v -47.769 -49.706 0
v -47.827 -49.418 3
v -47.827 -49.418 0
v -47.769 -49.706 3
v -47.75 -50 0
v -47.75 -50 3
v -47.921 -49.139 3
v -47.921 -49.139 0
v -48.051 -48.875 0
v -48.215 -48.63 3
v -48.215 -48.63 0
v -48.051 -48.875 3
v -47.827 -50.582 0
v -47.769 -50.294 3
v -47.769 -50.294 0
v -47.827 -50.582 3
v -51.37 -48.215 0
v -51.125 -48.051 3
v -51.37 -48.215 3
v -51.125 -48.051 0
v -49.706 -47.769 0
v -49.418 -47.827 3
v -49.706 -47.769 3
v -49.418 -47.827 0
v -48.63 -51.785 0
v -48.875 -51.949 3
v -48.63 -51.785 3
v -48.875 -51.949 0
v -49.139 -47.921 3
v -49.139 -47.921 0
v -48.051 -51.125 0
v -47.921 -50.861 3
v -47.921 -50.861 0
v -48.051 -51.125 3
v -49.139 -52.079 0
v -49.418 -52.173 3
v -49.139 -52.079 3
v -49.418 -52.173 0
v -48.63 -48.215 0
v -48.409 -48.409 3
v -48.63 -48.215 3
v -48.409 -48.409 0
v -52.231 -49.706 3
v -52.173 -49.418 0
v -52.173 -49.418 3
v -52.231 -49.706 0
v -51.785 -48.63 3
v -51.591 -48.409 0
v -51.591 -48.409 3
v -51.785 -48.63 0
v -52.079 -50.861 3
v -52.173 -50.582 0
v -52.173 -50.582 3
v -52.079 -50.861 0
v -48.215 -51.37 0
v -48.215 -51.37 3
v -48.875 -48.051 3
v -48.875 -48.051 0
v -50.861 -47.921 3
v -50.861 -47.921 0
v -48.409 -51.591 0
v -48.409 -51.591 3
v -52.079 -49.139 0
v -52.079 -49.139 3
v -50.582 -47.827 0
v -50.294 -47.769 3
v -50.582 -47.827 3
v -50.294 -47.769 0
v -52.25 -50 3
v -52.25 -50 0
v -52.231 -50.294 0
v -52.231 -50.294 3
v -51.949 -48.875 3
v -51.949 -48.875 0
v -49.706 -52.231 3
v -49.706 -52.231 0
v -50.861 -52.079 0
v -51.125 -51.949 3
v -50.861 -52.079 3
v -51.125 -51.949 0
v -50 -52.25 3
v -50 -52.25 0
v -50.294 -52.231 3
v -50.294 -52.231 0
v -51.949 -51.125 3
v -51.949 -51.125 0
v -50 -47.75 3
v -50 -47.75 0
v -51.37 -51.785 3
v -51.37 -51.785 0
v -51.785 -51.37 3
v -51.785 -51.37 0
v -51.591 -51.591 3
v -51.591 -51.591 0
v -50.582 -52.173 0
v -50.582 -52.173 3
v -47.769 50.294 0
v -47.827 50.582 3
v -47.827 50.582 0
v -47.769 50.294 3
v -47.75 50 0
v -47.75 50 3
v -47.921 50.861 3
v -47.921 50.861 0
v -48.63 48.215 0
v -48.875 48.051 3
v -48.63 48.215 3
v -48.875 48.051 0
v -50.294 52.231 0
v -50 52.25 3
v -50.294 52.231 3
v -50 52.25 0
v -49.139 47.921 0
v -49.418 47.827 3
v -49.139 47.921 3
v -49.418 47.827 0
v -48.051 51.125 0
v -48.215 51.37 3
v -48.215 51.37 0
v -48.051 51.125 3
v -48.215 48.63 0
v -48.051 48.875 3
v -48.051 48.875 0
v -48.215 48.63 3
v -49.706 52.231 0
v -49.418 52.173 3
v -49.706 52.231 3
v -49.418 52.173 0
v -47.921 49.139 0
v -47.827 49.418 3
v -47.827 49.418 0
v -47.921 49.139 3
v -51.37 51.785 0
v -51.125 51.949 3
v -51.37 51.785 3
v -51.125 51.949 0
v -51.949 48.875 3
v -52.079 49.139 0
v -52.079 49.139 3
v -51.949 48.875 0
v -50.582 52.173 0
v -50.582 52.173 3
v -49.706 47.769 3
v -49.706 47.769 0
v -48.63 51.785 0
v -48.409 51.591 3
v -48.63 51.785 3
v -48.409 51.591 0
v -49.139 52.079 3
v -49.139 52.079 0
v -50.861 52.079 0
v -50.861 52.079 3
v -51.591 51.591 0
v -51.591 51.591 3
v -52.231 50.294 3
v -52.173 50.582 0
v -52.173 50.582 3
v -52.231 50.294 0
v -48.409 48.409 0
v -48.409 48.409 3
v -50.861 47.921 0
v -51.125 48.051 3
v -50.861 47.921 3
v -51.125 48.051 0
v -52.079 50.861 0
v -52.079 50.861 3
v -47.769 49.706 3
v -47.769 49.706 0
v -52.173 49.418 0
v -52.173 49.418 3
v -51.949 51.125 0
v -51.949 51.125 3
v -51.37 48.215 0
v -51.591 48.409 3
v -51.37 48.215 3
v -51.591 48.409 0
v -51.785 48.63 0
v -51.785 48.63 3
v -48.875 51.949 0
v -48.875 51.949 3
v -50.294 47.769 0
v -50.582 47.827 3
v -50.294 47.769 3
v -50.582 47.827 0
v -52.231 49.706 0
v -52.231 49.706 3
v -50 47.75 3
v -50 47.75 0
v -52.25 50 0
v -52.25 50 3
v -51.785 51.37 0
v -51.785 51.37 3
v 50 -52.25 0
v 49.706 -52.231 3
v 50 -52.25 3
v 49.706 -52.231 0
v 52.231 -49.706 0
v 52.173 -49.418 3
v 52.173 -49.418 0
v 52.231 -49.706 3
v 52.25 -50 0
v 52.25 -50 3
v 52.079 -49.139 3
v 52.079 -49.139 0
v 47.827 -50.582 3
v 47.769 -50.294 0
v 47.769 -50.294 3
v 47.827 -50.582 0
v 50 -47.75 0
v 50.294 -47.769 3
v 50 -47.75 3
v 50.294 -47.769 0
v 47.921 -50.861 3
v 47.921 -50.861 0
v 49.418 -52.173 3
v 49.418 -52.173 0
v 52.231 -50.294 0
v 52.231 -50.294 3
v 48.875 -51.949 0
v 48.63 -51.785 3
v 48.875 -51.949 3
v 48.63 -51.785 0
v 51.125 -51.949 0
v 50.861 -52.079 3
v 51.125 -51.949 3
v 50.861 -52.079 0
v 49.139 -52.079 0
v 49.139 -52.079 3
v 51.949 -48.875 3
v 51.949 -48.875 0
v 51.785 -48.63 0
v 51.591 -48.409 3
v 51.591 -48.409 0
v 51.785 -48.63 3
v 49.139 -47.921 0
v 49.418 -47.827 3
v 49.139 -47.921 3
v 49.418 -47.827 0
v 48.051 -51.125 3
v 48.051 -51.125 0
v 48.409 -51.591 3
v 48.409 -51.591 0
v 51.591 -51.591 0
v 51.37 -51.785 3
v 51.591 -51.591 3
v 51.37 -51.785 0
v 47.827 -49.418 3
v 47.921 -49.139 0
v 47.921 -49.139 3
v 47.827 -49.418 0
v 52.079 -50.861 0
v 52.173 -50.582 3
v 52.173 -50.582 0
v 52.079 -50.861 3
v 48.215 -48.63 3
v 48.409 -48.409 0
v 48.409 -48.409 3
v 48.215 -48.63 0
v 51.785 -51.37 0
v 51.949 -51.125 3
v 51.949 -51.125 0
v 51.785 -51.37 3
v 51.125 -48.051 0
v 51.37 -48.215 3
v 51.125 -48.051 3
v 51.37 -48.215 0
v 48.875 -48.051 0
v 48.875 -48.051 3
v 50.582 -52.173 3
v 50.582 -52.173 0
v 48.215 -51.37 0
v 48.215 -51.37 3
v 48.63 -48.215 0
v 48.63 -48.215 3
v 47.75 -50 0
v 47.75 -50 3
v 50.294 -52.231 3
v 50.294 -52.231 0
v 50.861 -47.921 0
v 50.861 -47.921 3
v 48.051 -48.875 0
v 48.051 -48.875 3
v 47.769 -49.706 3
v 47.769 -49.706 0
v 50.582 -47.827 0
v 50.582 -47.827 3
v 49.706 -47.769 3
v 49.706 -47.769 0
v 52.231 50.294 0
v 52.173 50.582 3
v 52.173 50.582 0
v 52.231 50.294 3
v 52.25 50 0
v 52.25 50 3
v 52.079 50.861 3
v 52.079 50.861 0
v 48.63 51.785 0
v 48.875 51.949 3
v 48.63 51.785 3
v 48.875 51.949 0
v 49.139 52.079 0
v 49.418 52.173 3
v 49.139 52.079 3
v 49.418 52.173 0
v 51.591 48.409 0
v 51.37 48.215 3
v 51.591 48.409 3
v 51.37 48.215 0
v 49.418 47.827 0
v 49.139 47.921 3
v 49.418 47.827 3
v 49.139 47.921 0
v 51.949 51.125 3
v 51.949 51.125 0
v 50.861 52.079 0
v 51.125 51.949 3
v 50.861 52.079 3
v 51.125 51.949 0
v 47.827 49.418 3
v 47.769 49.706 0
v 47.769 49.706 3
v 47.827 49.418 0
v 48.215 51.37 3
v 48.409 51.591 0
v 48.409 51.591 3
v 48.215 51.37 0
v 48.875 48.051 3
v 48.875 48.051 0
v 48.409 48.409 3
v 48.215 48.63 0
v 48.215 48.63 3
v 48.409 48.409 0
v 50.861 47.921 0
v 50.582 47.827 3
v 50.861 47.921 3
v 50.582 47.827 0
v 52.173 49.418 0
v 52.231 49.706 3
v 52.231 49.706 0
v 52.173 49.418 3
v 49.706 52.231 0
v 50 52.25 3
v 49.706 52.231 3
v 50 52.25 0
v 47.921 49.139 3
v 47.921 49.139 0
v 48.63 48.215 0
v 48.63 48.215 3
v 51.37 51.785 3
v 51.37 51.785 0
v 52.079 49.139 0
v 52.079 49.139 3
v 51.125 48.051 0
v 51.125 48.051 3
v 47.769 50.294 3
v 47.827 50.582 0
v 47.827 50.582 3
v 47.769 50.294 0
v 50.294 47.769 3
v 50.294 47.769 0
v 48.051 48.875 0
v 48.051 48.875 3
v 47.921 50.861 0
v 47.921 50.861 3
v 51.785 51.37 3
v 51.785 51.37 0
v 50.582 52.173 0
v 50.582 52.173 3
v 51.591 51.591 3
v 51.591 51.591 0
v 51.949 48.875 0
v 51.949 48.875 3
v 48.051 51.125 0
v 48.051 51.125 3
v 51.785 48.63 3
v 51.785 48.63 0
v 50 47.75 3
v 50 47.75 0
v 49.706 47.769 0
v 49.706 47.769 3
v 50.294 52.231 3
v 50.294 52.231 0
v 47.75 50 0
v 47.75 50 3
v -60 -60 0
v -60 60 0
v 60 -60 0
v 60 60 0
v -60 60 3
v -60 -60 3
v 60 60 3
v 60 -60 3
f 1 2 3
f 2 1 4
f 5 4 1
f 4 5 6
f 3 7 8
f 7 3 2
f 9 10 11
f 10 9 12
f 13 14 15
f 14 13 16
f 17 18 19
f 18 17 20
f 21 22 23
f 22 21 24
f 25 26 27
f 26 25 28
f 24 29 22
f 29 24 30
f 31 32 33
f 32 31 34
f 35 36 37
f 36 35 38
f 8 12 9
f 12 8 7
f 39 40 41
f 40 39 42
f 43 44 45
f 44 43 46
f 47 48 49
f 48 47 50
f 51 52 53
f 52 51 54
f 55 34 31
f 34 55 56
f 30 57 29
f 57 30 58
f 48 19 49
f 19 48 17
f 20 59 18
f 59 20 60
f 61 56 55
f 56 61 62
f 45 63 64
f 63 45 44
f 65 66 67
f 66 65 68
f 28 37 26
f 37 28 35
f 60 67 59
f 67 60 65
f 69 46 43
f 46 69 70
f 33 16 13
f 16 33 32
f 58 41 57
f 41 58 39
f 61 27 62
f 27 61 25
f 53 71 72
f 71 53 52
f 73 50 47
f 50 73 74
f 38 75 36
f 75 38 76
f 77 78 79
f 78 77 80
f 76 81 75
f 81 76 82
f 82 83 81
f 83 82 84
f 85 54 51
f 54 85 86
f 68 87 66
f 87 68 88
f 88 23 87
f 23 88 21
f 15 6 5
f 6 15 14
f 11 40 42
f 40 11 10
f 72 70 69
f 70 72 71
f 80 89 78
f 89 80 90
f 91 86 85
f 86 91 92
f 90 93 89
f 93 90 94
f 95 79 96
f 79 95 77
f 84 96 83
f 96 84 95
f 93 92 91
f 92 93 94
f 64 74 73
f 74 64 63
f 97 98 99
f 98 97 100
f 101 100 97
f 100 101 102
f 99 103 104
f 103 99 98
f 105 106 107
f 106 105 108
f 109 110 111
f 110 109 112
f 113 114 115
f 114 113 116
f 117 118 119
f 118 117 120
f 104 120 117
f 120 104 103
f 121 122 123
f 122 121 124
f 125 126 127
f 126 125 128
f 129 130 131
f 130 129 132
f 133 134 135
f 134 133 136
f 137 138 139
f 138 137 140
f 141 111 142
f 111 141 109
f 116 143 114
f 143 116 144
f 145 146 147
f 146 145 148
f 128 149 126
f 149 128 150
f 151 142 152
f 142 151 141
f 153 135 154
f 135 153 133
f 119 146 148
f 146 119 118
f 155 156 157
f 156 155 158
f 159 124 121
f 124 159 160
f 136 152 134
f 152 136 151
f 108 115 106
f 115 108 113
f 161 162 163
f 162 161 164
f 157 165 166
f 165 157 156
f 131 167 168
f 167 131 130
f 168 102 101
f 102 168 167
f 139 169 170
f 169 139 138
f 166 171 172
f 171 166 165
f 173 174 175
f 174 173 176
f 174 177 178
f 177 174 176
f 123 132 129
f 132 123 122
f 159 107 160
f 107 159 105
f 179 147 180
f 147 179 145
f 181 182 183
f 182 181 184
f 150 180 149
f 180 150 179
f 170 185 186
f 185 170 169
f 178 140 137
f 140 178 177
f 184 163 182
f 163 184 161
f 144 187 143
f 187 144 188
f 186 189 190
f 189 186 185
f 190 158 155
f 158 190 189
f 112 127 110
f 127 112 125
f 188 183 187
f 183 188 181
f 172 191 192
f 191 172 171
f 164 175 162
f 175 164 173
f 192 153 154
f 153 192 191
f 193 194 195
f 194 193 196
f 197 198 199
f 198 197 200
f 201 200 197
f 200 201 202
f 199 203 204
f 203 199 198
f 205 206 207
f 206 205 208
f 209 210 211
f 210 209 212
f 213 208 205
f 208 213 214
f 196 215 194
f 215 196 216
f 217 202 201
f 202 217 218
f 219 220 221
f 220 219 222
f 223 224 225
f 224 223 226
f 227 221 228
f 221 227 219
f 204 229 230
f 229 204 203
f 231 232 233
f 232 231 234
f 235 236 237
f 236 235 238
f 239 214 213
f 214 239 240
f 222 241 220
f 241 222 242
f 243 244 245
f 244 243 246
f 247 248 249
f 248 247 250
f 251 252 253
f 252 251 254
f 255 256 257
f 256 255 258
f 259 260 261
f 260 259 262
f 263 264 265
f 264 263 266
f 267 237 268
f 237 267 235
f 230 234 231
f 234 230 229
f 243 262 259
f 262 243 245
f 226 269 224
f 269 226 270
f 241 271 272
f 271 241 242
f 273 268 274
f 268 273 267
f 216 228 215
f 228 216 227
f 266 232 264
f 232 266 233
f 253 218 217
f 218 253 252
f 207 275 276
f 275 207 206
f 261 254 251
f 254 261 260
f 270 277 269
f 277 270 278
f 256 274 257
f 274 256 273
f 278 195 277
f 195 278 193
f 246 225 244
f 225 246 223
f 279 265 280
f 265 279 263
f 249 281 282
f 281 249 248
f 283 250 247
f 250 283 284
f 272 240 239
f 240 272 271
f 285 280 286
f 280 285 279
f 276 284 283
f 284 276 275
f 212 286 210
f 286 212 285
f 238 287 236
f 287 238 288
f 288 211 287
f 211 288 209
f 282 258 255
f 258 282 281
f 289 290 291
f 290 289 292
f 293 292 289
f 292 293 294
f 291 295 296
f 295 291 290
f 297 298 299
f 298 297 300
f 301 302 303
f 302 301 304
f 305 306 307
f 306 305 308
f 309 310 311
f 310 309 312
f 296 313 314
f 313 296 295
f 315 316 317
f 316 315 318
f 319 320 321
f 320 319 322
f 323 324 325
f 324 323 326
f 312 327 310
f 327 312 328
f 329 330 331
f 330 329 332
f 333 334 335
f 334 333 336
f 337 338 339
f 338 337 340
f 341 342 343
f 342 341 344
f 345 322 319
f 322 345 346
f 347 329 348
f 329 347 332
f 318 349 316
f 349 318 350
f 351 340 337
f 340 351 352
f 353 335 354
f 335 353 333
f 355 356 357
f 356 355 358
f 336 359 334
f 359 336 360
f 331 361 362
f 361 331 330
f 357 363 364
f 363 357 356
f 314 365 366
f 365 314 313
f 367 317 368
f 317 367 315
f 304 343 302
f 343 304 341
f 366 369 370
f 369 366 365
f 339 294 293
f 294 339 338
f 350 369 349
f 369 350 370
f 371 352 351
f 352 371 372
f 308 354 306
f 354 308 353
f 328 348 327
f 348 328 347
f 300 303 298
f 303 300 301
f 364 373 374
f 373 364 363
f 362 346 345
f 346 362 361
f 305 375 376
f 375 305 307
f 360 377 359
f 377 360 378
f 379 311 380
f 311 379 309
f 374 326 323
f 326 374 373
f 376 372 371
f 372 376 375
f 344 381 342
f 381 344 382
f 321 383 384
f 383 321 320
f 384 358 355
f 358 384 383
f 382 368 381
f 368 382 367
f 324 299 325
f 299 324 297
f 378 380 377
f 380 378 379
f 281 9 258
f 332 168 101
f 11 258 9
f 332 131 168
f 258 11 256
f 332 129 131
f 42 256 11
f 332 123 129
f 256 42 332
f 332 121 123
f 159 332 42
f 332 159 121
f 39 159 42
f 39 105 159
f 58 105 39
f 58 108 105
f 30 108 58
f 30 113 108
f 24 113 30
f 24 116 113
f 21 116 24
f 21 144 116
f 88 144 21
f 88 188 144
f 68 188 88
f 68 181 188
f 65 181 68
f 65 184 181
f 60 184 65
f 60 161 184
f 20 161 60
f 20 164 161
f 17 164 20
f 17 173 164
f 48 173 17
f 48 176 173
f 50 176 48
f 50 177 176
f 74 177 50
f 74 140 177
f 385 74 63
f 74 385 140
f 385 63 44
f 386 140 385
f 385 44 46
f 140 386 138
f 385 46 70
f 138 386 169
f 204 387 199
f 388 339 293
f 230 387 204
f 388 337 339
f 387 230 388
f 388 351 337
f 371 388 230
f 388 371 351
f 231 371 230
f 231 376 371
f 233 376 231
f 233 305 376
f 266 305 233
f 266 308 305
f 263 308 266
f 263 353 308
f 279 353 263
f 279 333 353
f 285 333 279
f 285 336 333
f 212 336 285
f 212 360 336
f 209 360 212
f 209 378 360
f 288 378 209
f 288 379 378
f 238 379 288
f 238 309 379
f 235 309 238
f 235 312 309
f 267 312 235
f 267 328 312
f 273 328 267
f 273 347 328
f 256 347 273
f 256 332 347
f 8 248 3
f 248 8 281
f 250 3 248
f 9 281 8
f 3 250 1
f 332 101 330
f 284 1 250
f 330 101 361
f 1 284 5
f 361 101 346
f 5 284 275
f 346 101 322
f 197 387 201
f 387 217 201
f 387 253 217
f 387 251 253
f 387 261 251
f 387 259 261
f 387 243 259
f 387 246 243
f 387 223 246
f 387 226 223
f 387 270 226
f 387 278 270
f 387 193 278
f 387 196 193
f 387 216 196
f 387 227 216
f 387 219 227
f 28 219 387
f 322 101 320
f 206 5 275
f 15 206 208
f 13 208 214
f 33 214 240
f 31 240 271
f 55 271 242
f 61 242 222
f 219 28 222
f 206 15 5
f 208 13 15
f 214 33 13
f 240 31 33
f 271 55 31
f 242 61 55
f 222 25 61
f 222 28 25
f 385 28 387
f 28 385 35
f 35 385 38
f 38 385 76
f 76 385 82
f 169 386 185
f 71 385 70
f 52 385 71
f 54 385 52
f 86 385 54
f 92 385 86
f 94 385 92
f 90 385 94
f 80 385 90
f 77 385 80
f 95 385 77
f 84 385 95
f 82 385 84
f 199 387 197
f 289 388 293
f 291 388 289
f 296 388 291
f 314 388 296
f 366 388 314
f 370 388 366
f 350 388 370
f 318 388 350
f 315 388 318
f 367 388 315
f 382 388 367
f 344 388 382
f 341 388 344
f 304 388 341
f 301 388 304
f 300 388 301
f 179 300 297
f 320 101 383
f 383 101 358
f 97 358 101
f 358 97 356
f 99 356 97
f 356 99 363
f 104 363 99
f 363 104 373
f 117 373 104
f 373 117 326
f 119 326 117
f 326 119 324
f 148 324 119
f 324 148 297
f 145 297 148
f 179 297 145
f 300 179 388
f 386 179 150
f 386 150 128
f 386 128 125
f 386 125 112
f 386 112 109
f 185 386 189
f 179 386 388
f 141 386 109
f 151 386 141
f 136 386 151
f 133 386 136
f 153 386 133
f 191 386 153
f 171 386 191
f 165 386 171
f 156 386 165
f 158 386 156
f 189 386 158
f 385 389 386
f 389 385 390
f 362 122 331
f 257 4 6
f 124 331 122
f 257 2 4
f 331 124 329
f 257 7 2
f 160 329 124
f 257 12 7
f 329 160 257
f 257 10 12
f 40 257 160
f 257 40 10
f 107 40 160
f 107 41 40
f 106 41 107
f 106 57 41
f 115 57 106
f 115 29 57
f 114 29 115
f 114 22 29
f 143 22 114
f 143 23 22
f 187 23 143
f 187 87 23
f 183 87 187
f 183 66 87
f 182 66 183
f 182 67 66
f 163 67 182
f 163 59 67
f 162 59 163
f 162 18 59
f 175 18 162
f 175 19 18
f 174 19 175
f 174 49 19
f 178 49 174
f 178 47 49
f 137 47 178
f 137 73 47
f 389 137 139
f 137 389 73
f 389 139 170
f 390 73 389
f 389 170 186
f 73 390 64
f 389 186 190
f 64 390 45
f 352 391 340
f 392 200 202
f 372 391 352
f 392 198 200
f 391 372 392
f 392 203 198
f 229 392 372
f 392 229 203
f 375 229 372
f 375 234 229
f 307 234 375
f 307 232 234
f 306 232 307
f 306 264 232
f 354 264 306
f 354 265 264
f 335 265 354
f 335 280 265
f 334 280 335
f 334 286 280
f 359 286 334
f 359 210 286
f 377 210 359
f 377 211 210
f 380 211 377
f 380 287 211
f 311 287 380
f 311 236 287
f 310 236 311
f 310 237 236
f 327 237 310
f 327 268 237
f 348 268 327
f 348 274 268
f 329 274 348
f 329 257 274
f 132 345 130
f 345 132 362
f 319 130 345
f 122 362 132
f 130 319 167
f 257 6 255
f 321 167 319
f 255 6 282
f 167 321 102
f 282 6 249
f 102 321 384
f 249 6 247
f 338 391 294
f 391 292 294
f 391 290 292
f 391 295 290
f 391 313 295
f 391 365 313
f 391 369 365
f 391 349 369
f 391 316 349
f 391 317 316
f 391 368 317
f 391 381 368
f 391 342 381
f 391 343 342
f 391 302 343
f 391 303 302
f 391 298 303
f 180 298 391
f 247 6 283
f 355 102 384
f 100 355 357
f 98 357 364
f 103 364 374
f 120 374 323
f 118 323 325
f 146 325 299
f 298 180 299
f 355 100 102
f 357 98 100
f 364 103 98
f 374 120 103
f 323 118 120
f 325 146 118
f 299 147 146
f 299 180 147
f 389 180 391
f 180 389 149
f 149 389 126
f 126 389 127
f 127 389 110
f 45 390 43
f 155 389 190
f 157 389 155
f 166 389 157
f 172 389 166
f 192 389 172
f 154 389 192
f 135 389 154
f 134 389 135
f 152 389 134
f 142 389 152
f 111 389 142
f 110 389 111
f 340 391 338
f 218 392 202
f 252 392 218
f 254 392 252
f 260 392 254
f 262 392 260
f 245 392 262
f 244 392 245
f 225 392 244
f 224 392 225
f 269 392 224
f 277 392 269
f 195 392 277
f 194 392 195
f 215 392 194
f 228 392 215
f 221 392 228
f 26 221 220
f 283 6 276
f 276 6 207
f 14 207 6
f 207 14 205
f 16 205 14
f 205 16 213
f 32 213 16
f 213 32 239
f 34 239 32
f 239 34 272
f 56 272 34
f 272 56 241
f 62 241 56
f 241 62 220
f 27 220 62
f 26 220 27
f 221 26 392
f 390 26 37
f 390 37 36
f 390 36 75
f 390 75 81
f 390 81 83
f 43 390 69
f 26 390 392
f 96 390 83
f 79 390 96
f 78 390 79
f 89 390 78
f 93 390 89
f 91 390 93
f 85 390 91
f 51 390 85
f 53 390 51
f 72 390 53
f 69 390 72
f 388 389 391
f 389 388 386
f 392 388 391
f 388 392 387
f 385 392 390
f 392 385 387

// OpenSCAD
// SPDX-License-Identifier: CC-BY-NC-SA-4.0
// vesa — VESA FDMI (MIS) display-mount hole patterns.
// Data are FUNCTIONS (use<> does not import variables). Default orientation:
// pattern plane in X/Y, origin centered in X/Y, bottom face on Z=0; mm; central $fn.
// Provenance: [A] fetched spec/datasheet | [B] >=2 independent peers |
//             [C] single/derived or named-not-fetched | //VERIFY weak, confirm.
$fn = 48;

// M4 through-hole clearance — ISO 273 medium fit. Not re-derived here: this
// repo's single source of truth for the ISO 273 medium-fit series is the
// comment at libraries/rack19/rack19.scad:68 ("ISO 273's published medium
// fit series: M3->3.4, M4->4.5, M5->5.5, M6->6.6"). rack19_screw_clearance()
// itself has no "M4" case (rack19's own hardware doesn't use M4), so there is
// no accessor to call — this reuses the named convention directly rather
// than inventing a fresh literal. // [B] ISO 273 (named, not re-fetched)
function _vesa_m4_clearance() = 4.5;

// rows: [name, [spacing_w, spacing_h], screw, hole_dia]   // per-row tier comment
function _vesa_table() = [
    ["mis-d-75",  [75,75],   "m4", _vesa_m4_clearance()],  // [B] FDMI MIS-D 75, peers in RESEARCH.md
    ["mis-d-100", [100,100], "m4", _vesa_m4_clearance()],  // [B] FDMI MIS-D 100
    ["mis-e",     [200,100], "m4", _vesa_m4_clearance()],  // [B] FDMI MIS-E (4-corner subset modeled; see RESEARCH.md re: 6-hole variant not modeled)
];

function vesa_known_patterns()  = [for (e=_vesa_table()) e[0]];
function vesa_known_hole_roles() = ["structural-mount","component-mount","keep-out","alignment"];

function _vesa_row(name) =
    let (m = [for (e=_vesa_table()) if (e[0]==name) e])
    len(m)>0 ? m[0] : assert(false, str("vesa: unknown pattern '", name, "'"));

function vesa_spacing(name) = _vesa_row(name)[1];
function vesa_screw(name)   = _vesa_row(name)[2];

// four corner holes of the centered rectangle, all structural-mount
function vesa_holes(name, role=undef) =
    let (s = vesa_spacing(name), d = _vesa_row(name)[3],
         all = [ for (sx=[-1,1]) for (sy=[-1,1])
                 [sx*s[0]/2, sy*s[1]/2, "structural-mount", d] ])
    role==undef || role=="all" ? all
    : assert(len([for (r=vesa_known_hole_roles()) if (r==role) r])>0,
             str("vesa: unknown role '", role, "'"))
      [for (h=all) if (h[2]==role) h];

function vesa_holes_xy(name, role=undef) = [for (h=vesa_holes(name,role)) [h[0],h[1]]];

// hole-stamp cutter: dia=-1 → per-hole tagged dia; positive → uniform override.
module vesa_mount_holes(name, dia=-1, depth=6) {
    for (h = vesa_holes(name)) {
        r = (dia<0 ? h[3] : dia)/2;
        translate([h[0], h[1], -1]) cylinder(h=depth+2, r=r);
    }
}

// reference plate placeholder (non-print demo): a thin centered plate the size of
// the pattern + margin, holes stamped. Support-free (flat).
module vesa_placeholder(name, margin=10, thickness=3) {
    s = vesa_spacing(name);
    difference() {
        linear_extrude(thickness)
            square([s[0]+2*margin, s[1]+2*margin], center=true);
        vesa_mount_holes(name, depth=thickness);
    }
}

// Visual self-check when opened directly.
vesa_placeholder("mis-d-100");
